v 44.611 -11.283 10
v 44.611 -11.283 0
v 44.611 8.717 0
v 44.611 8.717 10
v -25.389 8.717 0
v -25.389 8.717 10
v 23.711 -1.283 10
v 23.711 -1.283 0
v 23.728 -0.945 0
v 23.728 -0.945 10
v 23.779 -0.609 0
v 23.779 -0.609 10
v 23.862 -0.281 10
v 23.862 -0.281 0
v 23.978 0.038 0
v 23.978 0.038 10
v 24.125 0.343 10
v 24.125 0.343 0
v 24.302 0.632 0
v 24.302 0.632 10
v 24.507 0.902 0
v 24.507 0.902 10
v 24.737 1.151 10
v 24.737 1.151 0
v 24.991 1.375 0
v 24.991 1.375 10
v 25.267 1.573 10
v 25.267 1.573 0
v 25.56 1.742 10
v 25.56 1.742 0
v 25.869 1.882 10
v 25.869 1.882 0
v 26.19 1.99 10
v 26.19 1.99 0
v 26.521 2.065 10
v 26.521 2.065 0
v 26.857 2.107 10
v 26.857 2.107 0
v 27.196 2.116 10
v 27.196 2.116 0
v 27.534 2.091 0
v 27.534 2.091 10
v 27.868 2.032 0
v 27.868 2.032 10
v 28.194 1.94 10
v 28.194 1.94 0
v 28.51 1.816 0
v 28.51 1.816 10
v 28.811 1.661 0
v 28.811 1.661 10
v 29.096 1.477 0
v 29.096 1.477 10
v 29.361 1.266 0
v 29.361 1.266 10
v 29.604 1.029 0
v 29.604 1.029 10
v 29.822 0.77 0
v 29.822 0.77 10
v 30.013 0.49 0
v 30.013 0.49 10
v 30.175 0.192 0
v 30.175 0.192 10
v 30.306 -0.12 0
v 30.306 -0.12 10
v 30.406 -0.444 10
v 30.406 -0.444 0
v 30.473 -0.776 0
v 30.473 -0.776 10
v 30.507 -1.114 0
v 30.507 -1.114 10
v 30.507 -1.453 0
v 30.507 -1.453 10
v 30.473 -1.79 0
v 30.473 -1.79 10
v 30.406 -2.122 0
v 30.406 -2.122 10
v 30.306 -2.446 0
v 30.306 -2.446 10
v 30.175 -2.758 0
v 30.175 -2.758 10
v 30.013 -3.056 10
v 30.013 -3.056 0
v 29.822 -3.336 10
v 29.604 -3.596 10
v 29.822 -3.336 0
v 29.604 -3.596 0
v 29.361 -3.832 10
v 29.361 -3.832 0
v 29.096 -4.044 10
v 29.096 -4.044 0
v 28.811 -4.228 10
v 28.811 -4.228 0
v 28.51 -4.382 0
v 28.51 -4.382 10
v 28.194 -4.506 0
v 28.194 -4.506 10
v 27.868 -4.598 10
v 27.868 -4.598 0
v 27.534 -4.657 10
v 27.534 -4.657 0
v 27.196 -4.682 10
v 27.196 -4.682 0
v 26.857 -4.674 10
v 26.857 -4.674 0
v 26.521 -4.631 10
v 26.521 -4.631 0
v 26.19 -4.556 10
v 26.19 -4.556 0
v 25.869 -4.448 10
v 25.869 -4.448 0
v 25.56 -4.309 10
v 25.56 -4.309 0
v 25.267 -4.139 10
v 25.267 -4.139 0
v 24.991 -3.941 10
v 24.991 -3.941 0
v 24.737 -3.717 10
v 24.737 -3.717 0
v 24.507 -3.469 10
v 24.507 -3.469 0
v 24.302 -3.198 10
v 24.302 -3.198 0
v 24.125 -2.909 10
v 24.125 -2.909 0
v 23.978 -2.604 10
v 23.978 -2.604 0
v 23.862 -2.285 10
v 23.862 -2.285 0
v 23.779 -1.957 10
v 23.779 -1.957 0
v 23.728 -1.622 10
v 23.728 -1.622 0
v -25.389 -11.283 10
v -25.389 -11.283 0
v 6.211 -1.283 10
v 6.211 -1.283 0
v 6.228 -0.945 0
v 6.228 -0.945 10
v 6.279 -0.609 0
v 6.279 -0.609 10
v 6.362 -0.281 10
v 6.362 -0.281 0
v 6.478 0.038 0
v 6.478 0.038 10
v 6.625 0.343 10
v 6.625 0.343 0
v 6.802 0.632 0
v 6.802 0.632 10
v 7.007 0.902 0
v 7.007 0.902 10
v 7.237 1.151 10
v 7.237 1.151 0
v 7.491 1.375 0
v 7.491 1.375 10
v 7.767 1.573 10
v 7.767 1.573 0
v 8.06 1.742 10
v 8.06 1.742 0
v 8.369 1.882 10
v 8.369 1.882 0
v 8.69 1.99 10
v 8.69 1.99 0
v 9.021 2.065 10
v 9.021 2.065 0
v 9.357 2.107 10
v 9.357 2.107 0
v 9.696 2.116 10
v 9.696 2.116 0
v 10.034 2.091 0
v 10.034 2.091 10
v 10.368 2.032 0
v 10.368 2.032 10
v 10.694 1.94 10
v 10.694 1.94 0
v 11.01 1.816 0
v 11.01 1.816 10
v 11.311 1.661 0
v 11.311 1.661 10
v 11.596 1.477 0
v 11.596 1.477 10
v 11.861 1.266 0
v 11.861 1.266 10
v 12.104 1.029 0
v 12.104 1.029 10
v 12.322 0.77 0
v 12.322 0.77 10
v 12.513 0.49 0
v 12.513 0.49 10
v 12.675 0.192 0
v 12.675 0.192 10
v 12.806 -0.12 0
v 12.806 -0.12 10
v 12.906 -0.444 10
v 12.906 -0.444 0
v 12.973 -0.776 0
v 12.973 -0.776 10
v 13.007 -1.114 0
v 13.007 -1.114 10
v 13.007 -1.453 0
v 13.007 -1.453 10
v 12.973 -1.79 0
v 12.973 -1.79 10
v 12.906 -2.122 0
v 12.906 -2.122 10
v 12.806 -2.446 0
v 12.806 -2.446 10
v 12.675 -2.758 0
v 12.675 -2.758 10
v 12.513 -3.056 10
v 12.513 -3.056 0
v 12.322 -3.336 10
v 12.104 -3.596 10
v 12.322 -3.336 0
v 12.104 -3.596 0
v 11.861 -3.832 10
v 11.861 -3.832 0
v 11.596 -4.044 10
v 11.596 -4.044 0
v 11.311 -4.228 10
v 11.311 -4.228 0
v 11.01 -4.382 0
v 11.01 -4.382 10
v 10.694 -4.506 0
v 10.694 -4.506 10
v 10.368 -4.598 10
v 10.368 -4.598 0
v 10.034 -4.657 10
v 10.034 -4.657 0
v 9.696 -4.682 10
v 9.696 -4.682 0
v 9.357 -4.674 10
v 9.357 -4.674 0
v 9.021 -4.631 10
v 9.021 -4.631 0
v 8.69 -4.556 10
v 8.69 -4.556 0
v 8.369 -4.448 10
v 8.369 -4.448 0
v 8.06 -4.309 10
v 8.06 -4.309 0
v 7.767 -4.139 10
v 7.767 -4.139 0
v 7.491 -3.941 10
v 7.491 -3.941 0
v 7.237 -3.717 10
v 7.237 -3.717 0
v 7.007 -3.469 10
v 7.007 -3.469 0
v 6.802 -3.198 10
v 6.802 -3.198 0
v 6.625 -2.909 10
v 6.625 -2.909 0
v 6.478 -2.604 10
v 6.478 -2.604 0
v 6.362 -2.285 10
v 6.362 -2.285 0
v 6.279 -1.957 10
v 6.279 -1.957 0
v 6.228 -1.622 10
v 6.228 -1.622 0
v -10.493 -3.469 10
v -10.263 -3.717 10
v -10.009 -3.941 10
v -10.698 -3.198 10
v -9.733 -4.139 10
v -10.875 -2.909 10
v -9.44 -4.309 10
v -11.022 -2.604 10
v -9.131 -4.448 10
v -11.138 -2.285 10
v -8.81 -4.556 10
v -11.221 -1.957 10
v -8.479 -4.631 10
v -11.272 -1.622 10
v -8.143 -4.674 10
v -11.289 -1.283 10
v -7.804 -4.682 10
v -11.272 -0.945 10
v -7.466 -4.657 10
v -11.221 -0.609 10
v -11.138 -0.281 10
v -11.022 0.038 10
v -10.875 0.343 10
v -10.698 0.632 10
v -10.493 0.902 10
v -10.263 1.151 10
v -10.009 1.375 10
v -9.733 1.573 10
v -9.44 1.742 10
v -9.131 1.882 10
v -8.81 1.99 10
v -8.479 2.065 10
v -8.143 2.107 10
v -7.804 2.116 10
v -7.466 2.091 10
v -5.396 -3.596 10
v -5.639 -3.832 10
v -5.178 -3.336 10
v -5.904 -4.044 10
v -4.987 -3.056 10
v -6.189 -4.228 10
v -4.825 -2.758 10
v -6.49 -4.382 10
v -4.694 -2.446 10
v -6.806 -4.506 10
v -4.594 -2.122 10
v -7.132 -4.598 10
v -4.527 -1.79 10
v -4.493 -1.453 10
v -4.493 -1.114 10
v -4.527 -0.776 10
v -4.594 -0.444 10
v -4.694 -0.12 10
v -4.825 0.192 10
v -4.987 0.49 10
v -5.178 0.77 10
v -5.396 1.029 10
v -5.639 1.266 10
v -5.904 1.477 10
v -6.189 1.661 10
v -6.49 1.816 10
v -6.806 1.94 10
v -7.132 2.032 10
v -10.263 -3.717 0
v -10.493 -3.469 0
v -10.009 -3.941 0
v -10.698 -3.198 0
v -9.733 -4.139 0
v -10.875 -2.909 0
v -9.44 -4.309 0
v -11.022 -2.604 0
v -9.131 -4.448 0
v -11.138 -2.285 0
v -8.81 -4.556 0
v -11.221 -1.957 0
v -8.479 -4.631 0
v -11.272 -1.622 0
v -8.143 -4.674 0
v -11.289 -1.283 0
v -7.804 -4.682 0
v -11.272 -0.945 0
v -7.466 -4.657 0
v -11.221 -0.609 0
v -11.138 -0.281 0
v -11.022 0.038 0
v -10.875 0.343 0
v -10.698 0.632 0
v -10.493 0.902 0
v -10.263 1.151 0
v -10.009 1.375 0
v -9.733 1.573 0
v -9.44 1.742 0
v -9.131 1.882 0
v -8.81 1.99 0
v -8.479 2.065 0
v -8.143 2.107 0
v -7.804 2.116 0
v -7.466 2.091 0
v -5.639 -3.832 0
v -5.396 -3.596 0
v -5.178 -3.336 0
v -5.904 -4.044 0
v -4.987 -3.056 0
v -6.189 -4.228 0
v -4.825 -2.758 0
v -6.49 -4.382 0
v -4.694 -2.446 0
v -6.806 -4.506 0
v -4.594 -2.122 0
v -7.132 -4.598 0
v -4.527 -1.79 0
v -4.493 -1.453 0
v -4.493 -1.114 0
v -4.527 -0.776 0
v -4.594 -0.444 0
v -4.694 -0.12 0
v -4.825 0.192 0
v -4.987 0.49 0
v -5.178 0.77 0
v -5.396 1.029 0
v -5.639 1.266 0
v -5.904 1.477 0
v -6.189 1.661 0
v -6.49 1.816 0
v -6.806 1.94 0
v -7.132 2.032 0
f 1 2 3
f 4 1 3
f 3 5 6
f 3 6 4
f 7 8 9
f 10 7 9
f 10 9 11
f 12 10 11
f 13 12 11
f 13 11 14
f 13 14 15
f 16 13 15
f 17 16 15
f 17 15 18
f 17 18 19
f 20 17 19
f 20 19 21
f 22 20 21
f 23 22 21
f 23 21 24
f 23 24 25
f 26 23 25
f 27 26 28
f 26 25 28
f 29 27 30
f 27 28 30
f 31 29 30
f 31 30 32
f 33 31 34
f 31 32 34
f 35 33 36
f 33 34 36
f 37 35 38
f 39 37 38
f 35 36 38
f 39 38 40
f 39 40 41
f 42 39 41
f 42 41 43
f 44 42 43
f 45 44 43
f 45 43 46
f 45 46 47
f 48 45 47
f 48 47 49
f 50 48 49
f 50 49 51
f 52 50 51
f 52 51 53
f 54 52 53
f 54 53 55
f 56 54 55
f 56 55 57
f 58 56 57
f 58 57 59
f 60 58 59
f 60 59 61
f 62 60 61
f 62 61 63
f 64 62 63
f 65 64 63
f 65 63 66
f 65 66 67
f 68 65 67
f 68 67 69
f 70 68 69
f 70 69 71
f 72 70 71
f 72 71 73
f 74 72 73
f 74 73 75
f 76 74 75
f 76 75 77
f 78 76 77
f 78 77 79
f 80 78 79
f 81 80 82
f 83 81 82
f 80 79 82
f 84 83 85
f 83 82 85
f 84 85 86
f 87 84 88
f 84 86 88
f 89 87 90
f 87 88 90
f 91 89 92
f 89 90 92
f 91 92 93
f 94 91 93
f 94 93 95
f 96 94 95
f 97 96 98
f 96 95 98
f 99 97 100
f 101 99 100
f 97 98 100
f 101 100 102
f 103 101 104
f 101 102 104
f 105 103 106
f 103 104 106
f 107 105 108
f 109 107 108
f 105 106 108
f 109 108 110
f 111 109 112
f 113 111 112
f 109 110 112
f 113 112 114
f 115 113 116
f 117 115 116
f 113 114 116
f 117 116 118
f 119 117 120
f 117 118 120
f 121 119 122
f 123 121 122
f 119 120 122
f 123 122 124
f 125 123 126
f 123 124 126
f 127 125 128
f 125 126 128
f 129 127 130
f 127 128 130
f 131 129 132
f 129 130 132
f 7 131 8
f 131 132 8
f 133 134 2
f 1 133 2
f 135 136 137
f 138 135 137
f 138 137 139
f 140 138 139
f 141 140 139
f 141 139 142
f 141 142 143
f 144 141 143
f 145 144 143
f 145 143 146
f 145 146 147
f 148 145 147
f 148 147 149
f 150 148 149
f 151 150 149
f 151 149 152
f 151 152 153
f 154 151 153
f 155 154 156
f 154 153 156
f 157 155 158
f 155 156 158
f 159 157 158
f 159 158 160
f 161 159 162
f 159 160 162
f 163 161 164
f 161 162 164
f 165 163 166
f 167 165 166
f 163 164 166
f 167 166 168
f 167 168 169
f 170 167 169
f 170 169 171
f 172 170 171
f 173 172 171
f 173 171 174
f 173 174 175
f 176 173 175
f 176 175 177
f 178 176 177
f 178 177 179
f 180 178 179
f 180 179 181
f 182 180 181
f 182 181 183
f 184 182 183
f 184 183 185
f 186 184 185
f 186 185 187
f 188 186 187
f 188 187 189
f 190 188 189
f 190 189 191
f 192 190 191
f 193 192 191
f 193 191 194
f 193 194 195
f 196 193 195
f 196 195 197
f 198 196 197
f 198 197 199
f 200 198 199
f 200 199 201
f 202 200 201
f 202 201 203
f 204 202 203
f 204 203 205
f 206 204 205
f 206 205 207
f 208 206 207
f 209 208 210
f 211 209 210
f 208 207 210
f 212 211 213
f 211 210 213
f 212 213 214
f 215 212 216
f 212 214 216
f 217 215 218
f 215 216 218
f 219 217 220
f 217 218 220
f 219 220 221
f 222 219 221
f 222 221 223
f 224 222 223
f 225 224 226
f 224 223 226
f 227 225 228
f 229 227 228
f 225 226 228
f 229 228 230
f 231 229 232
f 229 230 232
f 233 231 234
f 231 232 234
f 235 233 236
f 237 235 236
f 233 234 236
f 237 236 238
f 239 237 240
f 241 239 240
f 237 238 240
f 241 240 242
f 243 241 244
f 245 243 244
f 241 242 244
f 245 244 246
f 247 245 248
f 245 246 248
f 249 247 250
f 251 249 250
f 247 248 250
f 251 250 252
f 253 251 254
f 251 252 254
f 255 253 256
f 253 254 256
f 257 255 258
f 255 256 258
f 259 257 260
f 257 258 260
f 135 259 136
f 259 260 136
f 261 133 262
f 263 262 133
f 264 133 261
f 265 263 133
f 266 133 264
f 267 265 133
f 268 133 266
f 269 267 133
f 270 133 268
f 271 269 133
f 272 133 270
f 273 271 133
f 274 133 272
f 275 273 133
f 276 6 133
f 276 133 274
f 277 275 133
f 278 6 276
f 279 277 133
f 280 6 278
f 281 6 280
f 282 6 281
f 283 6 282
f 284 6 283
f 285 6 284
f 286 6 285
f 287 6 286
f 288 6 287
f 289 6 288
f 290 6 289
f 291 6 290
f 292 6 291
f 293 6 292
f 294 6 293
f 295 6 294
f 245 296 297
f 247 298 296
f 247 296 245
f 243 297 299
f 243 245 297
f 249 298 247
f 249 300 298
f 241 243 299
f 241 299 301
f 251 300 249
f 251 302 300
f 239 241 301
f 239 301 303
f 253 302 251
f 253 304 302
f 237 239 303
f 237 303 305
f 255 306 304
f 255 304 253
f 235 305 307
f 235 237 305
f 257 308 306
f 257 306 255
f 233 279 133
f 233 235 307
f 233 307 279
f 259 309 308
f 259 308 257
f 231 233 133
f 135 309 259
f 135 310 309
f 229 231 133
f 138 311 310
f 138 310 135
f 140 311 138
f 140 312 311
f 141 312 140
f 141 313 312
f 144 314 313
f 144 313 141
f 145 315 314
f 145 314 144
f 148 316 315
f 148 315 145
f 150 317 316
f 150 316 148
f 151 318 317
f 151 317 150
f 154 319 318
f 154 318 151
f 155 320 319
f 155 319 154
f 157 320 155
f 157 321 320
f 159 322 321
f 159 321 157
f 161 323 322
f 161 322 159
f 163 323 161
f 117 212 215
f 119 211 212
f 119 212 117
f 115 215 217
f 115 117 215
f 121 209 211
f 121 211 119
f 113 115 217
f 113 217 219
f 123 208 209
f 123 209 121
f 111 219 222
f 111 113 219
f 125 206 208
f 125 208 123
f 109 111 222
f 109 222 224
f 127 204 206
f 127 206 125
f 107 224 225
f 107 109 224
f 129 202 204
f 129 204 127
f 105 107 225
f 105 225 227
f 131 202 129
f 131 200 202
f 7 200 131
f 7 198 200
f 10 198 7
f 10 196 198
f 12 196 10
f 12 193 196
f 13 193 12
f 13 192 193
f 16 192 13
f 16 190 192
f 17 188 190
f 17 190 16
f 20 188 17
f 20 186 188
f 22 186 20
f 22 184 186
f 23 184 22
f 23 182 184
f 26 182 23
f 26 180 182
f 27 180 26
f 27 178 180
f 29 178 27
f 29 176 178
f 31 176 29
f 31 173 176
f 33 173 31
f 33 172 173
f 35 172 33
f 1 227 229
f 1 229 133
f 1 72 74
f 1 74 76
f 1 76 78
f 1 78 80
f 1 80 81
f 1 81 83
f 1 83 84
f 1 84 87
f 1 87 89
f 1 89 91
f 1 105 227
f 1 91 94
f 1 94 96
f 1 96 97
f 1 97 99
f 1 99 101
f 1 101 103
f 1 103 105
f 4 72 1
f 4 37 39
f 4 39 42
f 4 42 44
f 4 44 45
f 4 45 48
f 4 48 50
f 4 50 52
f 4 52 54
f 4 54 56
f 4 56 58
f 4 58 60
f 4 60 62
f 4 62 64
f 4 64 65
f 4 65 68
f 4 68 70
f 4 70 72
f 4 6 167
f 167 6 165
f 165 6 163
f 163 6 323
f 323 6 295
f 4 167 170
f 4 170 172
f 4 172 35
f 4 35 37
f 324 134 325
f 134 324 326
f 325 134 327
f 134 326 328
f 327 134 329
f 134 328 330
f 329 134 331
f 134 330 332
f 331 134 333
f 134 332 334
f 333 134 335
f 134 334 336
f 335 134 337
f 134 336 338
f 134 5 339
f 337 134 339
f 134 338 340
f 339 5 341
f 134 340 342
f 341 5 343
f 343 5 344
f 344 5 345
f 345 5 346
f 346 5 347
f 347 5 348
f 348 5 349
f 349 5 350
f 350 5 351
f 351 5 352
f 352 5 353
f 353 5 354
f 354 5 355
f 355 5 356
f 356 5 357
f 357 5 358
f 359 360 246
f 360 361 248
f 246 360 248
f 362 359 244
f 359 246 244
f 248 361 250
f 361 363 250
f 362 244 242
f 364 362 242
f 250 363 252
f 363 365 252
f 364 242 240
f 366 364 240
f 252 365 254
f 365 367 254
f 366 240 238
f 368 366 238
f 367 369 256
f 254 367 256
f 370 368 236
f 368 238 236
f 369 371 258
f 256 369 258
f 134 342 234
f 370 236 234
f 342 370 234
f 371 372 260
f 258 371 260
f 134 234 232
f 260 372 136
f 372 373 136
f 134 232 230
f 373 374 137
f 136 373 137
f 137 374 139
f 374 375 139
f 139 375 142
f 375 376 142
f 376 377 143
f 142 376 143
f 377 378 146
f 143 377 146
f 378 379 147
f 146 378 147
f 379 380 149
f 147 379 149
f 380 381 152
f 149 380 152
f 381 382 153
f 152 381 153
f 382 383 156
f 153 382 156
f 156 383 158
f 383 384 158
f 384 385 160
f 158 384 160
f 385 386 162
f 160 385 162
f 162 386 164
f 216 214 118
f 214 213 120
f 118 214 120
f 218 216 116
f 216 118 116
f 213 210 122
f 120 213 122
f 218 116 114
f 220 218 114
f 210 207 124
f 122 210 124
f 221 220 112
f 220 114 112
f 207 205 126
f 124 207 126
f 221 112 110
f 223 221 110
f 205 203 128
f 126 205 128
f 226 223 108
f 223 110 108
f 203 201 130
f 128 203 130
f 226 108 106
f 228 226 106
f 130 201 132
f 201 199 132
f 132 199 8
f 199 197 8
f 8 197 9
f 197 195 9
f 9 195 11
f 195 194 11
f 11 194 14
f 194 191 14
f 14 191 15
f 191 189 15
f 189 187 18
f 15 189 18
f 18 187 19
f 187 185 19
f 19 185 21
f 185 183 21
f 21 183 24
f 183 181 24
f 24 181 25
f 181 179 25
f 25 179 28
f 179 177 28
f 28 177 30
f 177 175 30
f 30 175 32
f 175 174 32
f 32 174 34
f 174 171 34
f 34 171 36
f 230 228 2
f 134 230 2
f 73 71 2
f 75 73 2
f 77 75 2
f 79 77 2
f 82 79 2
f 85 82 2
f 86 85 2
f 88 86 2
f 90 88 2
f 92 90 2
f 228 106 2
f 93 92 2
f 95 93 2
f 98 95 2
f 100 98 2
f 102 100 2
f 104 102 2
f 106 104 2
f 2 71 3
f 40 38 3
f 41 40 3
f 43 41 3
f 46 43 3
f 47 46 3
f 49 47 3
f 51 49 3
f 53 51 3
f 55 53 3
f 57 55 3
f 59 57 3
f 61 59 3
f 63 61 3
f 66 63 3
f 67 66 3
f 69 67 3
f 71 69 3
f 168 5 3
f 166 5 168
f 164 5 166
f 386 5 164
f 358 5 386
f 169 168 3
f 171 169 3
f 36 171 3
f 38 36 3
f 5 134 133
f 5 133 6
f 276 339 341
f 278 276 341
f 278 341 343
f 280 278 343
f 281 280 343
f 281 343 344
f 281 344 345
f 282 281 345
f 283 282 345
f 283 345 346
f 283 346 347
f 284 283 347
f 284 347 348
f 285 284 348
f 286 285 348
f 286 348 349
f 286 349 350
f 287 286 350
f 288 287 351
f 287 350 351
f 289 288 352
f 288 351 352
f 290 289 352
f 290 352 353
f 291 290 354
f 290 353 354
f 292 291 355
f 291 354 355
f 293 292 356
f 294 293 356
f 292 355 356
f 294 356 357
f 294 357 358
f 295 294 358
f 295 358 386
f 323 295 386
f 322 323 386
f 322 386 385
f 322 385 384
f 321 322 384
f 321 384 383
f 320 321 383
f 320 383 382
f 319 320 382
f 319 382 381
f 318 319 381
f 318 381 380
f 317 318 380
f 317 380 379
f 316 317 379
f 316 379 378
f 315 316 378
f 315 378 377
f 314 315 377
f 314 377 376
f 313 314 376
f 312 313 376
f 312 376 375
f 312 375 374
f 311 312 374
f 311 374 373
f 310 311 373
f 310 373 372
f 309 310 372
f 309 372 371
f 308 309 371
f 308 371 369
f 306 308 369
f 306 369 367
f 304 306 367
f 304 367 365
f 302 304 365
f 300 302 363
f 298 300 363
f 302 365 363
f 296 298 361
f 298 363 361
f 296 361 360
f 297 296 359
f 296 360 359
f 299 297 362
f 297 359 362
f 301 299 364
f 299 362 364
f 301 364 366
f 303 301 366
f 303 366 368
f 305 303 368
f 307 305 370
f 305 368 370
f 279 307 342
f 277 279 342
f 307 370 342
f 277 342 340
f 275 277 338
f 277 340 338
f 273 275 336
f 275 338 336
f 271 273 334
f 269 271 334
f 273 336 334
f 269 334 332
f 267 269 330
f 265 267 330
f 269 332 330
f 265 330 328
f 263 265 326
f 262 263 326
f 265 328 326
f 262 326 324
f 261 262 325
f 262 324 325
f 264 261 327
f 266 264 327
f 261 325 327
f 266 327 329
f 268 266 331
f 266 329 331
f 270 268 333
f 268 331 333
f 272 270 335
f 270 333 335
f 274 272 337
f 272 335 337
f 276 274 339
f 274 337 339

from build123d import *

# Parameters (mm, degrees)
F0_W     = 70
F0_H     = 20
F1_DEPTH = 10
F3_D     = 6.8
F3_DEPTH = 15.75
F3_TIP   = 2.0429261047


with BuildPart() as f1:
    # F0 (on Top) → F1 (new body)
    with BuildSketch(Plane.XY):
        with Locations((9.6113178879, -1.2831067624)):
            Rectangle(F0_W, F0_H)
    extrude(amount=F1_DEPTH)

    # F3
    with Locations(Plane.XY.offset(10)):
        with Locations((27.1113178879, -1.2831067624), (9.6113178879, -1.2831067624), (-7.8886821121, -1.2831067624)):
            Hole(F3_D / 2, depth=F3_DEPTH)
            with Locations((0, 0, -(F3_DEPTH + F3_TIP / 2))):  # 118° drill point
                Cone(0, F3_D / 2, F3_TIP, mode=Mode.SUBTRACT)


solid = f1.part
